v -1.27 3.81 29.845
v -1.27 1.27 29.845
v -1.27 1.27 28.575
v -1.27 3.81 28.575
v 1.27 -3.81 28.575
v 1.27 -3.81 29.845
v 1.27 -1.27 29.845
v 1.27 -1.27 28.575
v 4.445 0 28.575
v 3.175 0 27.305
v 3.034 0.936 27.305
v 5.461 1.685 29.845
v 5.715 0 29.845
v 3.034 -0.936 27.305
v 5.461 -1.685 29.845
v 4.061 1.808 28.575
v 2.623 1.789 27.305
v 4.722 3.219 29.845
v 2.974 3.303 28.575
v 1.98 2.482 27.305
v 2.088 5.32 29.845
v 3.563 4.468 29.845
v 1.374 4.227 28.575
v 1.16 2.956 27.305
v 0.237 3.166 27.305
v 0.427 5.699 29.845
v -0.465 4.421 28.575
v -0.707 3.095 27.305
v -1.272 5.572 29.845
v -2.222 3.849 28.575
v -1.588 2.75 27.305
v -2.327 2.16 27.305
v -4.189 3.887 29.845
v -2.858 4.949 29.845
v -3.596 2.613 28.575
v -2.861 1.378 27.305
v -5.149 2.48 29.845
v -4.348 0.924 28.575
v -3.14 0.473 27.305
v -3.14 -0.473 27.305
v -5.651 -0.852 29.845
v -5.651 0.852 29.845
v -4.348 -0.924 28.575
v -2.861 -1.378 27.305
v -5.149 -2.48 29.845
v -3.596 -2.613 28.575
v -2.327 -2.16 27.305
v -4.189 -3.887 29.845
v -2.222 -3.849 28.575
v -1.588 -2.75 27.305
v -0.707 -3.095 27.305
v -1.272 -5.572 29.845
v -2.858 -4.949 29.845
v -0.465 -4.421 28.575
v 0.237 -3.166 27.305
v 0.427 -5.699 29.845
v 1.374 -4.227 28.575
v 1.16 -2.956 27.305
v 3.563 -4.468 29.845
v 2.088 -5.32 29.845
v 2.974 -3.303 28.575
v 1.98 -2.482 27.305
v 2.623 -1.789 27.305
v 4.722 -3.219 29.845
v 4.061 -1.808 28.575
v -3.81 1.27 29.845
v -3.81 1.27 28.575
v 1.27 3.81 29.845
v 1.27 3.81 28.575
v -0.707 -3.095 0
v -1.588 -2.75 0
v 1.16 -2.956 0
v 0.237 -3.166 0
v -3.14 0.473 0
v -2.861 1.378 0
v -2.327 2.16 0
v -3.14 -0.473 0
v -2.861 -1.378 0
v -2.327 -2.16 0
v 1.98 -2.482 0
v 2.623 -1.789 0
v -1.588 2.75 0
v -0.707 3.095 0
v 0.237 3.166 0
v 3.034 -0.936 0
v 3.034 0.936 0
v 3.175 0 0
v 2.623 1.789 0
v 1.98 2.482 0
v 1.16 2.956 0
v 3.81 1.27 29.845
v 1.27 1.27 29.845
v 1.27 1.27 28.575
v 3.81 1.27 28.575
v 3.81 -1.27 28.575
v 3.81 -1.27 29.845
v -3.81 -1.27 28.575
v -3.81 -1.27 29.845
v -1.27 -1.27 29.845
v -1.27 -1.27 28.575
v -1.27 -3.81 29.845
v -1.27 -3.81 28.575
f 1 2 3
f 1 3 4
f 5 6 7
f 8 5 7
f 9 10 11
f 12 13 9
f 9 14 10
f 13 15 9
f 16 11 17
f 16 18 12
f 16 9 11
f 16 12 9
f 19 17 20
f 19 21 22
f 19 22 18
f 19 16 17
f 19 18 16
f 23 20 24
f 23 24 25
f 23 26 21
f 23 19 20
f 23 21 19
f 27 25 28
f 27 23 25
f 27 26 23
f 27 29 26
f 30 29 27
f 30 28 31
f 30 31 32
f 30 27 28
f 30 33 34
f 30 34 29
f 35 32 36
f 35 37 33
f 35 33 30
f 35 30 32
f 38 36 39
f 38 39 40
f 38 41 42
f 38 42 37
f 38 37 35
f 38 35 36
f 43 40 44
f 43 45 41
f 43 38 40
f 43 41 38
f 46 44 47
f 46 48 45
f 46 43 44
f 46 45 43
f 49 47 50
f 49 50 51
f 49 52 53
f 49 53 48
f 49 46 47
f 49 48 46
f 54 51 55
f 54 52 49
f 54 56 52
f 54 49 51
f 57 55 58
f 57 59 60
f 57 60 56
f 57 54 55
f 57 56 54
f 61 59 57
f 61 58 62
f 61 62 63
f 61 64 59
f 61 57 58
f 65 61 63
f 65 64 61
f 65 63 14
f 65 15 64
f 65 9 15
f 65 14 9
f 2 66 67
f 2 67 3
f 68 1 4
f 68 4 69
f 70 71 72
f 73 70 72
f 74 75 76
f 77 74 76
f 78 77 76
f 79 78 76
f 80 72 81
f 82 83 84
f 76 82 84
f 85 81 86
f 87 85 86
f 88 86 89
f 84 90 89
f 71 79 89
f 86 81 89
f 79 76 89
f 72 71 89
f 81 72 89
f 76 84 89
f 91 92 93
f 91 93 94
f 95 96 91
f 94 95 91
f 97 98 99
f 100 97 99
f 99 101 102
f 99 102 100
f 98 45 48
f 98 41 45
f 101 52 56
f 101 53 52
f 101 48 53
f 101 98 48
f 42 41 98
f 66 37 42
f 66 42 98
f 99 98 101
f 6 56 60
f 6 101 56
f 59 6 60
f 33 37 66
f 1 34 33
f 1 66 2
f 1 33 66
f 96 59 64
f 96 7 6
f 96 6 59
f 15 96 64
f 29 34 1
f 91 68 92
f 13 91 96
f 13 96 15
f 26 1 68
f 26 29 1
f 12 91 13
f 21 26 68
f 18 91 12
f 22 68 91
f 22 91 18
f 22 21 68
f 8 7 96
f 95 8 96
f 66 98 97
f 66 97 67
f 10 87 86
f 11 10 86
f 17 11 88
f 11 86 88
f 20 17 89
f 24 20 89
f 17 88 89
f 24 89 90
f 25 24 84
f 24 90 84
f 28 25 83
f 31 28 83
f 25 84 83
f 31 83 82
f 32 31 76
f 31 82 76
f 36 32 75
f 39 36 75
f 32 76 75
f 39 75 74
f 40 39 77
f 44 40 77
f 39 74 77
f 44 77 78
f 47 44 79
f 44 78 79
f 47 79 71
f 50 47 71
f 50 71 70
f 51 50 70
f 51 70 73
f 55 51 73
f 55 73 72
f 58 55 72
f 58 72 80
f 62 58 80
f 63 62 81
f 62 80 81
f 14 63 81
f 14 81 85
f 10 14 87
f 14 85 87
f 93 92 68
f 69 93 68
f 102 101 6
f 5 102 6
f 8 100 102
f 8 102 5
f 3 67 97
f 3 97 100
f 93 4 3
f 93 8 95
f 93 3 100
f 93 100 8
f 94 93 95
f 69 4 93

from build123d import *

# Parameters (mm, degrees)
F0_R      = 3.175
F1_DEPTH  = 27.305
F1_FACE_R = 3.175
F2_DEPTH  = 2.54
F2_TAPER  = -45
F3_W      = 2.54
F3_H      = 2.54
F4_DEPTH  = 1.27


with BuildPart() as f1:
    # F0 (on Top) → F1 (new body)
    with BuildSketch(Plane.XY):
        Circle(F0_R)
    extrude(amount=F1_DEPTH)

    # F1_face (on face) → F2 (join)
    with BuildSketch(Plane.XY.offset(27.305)):
        Circle(F1_FACE_R)
    extrude(amount=F2_DEPTH, taper=F2_TAPER)

    # F3 (on face) → F4 (cut)
    with BuildSketch(Plane.XY.offset(29.845)):
        with Locations((0, 2.54)):
            Rectangle(F3_W, F3_H)
        with Locations((-2.54, 0)):
            Rectangle(F3_W, F3_H)
        Rectangle(F3_W, F3_H)
        with Locations((2.54, 0)):
            Rectangle(F3_W, F3_H)
        with Locations((0, -2.54)):
            Rectangle(F3_W, F3_H)
    extrude(amount=-F4_DEPTH, mode=Mode.SUBTRACT)


solid = f1.part
